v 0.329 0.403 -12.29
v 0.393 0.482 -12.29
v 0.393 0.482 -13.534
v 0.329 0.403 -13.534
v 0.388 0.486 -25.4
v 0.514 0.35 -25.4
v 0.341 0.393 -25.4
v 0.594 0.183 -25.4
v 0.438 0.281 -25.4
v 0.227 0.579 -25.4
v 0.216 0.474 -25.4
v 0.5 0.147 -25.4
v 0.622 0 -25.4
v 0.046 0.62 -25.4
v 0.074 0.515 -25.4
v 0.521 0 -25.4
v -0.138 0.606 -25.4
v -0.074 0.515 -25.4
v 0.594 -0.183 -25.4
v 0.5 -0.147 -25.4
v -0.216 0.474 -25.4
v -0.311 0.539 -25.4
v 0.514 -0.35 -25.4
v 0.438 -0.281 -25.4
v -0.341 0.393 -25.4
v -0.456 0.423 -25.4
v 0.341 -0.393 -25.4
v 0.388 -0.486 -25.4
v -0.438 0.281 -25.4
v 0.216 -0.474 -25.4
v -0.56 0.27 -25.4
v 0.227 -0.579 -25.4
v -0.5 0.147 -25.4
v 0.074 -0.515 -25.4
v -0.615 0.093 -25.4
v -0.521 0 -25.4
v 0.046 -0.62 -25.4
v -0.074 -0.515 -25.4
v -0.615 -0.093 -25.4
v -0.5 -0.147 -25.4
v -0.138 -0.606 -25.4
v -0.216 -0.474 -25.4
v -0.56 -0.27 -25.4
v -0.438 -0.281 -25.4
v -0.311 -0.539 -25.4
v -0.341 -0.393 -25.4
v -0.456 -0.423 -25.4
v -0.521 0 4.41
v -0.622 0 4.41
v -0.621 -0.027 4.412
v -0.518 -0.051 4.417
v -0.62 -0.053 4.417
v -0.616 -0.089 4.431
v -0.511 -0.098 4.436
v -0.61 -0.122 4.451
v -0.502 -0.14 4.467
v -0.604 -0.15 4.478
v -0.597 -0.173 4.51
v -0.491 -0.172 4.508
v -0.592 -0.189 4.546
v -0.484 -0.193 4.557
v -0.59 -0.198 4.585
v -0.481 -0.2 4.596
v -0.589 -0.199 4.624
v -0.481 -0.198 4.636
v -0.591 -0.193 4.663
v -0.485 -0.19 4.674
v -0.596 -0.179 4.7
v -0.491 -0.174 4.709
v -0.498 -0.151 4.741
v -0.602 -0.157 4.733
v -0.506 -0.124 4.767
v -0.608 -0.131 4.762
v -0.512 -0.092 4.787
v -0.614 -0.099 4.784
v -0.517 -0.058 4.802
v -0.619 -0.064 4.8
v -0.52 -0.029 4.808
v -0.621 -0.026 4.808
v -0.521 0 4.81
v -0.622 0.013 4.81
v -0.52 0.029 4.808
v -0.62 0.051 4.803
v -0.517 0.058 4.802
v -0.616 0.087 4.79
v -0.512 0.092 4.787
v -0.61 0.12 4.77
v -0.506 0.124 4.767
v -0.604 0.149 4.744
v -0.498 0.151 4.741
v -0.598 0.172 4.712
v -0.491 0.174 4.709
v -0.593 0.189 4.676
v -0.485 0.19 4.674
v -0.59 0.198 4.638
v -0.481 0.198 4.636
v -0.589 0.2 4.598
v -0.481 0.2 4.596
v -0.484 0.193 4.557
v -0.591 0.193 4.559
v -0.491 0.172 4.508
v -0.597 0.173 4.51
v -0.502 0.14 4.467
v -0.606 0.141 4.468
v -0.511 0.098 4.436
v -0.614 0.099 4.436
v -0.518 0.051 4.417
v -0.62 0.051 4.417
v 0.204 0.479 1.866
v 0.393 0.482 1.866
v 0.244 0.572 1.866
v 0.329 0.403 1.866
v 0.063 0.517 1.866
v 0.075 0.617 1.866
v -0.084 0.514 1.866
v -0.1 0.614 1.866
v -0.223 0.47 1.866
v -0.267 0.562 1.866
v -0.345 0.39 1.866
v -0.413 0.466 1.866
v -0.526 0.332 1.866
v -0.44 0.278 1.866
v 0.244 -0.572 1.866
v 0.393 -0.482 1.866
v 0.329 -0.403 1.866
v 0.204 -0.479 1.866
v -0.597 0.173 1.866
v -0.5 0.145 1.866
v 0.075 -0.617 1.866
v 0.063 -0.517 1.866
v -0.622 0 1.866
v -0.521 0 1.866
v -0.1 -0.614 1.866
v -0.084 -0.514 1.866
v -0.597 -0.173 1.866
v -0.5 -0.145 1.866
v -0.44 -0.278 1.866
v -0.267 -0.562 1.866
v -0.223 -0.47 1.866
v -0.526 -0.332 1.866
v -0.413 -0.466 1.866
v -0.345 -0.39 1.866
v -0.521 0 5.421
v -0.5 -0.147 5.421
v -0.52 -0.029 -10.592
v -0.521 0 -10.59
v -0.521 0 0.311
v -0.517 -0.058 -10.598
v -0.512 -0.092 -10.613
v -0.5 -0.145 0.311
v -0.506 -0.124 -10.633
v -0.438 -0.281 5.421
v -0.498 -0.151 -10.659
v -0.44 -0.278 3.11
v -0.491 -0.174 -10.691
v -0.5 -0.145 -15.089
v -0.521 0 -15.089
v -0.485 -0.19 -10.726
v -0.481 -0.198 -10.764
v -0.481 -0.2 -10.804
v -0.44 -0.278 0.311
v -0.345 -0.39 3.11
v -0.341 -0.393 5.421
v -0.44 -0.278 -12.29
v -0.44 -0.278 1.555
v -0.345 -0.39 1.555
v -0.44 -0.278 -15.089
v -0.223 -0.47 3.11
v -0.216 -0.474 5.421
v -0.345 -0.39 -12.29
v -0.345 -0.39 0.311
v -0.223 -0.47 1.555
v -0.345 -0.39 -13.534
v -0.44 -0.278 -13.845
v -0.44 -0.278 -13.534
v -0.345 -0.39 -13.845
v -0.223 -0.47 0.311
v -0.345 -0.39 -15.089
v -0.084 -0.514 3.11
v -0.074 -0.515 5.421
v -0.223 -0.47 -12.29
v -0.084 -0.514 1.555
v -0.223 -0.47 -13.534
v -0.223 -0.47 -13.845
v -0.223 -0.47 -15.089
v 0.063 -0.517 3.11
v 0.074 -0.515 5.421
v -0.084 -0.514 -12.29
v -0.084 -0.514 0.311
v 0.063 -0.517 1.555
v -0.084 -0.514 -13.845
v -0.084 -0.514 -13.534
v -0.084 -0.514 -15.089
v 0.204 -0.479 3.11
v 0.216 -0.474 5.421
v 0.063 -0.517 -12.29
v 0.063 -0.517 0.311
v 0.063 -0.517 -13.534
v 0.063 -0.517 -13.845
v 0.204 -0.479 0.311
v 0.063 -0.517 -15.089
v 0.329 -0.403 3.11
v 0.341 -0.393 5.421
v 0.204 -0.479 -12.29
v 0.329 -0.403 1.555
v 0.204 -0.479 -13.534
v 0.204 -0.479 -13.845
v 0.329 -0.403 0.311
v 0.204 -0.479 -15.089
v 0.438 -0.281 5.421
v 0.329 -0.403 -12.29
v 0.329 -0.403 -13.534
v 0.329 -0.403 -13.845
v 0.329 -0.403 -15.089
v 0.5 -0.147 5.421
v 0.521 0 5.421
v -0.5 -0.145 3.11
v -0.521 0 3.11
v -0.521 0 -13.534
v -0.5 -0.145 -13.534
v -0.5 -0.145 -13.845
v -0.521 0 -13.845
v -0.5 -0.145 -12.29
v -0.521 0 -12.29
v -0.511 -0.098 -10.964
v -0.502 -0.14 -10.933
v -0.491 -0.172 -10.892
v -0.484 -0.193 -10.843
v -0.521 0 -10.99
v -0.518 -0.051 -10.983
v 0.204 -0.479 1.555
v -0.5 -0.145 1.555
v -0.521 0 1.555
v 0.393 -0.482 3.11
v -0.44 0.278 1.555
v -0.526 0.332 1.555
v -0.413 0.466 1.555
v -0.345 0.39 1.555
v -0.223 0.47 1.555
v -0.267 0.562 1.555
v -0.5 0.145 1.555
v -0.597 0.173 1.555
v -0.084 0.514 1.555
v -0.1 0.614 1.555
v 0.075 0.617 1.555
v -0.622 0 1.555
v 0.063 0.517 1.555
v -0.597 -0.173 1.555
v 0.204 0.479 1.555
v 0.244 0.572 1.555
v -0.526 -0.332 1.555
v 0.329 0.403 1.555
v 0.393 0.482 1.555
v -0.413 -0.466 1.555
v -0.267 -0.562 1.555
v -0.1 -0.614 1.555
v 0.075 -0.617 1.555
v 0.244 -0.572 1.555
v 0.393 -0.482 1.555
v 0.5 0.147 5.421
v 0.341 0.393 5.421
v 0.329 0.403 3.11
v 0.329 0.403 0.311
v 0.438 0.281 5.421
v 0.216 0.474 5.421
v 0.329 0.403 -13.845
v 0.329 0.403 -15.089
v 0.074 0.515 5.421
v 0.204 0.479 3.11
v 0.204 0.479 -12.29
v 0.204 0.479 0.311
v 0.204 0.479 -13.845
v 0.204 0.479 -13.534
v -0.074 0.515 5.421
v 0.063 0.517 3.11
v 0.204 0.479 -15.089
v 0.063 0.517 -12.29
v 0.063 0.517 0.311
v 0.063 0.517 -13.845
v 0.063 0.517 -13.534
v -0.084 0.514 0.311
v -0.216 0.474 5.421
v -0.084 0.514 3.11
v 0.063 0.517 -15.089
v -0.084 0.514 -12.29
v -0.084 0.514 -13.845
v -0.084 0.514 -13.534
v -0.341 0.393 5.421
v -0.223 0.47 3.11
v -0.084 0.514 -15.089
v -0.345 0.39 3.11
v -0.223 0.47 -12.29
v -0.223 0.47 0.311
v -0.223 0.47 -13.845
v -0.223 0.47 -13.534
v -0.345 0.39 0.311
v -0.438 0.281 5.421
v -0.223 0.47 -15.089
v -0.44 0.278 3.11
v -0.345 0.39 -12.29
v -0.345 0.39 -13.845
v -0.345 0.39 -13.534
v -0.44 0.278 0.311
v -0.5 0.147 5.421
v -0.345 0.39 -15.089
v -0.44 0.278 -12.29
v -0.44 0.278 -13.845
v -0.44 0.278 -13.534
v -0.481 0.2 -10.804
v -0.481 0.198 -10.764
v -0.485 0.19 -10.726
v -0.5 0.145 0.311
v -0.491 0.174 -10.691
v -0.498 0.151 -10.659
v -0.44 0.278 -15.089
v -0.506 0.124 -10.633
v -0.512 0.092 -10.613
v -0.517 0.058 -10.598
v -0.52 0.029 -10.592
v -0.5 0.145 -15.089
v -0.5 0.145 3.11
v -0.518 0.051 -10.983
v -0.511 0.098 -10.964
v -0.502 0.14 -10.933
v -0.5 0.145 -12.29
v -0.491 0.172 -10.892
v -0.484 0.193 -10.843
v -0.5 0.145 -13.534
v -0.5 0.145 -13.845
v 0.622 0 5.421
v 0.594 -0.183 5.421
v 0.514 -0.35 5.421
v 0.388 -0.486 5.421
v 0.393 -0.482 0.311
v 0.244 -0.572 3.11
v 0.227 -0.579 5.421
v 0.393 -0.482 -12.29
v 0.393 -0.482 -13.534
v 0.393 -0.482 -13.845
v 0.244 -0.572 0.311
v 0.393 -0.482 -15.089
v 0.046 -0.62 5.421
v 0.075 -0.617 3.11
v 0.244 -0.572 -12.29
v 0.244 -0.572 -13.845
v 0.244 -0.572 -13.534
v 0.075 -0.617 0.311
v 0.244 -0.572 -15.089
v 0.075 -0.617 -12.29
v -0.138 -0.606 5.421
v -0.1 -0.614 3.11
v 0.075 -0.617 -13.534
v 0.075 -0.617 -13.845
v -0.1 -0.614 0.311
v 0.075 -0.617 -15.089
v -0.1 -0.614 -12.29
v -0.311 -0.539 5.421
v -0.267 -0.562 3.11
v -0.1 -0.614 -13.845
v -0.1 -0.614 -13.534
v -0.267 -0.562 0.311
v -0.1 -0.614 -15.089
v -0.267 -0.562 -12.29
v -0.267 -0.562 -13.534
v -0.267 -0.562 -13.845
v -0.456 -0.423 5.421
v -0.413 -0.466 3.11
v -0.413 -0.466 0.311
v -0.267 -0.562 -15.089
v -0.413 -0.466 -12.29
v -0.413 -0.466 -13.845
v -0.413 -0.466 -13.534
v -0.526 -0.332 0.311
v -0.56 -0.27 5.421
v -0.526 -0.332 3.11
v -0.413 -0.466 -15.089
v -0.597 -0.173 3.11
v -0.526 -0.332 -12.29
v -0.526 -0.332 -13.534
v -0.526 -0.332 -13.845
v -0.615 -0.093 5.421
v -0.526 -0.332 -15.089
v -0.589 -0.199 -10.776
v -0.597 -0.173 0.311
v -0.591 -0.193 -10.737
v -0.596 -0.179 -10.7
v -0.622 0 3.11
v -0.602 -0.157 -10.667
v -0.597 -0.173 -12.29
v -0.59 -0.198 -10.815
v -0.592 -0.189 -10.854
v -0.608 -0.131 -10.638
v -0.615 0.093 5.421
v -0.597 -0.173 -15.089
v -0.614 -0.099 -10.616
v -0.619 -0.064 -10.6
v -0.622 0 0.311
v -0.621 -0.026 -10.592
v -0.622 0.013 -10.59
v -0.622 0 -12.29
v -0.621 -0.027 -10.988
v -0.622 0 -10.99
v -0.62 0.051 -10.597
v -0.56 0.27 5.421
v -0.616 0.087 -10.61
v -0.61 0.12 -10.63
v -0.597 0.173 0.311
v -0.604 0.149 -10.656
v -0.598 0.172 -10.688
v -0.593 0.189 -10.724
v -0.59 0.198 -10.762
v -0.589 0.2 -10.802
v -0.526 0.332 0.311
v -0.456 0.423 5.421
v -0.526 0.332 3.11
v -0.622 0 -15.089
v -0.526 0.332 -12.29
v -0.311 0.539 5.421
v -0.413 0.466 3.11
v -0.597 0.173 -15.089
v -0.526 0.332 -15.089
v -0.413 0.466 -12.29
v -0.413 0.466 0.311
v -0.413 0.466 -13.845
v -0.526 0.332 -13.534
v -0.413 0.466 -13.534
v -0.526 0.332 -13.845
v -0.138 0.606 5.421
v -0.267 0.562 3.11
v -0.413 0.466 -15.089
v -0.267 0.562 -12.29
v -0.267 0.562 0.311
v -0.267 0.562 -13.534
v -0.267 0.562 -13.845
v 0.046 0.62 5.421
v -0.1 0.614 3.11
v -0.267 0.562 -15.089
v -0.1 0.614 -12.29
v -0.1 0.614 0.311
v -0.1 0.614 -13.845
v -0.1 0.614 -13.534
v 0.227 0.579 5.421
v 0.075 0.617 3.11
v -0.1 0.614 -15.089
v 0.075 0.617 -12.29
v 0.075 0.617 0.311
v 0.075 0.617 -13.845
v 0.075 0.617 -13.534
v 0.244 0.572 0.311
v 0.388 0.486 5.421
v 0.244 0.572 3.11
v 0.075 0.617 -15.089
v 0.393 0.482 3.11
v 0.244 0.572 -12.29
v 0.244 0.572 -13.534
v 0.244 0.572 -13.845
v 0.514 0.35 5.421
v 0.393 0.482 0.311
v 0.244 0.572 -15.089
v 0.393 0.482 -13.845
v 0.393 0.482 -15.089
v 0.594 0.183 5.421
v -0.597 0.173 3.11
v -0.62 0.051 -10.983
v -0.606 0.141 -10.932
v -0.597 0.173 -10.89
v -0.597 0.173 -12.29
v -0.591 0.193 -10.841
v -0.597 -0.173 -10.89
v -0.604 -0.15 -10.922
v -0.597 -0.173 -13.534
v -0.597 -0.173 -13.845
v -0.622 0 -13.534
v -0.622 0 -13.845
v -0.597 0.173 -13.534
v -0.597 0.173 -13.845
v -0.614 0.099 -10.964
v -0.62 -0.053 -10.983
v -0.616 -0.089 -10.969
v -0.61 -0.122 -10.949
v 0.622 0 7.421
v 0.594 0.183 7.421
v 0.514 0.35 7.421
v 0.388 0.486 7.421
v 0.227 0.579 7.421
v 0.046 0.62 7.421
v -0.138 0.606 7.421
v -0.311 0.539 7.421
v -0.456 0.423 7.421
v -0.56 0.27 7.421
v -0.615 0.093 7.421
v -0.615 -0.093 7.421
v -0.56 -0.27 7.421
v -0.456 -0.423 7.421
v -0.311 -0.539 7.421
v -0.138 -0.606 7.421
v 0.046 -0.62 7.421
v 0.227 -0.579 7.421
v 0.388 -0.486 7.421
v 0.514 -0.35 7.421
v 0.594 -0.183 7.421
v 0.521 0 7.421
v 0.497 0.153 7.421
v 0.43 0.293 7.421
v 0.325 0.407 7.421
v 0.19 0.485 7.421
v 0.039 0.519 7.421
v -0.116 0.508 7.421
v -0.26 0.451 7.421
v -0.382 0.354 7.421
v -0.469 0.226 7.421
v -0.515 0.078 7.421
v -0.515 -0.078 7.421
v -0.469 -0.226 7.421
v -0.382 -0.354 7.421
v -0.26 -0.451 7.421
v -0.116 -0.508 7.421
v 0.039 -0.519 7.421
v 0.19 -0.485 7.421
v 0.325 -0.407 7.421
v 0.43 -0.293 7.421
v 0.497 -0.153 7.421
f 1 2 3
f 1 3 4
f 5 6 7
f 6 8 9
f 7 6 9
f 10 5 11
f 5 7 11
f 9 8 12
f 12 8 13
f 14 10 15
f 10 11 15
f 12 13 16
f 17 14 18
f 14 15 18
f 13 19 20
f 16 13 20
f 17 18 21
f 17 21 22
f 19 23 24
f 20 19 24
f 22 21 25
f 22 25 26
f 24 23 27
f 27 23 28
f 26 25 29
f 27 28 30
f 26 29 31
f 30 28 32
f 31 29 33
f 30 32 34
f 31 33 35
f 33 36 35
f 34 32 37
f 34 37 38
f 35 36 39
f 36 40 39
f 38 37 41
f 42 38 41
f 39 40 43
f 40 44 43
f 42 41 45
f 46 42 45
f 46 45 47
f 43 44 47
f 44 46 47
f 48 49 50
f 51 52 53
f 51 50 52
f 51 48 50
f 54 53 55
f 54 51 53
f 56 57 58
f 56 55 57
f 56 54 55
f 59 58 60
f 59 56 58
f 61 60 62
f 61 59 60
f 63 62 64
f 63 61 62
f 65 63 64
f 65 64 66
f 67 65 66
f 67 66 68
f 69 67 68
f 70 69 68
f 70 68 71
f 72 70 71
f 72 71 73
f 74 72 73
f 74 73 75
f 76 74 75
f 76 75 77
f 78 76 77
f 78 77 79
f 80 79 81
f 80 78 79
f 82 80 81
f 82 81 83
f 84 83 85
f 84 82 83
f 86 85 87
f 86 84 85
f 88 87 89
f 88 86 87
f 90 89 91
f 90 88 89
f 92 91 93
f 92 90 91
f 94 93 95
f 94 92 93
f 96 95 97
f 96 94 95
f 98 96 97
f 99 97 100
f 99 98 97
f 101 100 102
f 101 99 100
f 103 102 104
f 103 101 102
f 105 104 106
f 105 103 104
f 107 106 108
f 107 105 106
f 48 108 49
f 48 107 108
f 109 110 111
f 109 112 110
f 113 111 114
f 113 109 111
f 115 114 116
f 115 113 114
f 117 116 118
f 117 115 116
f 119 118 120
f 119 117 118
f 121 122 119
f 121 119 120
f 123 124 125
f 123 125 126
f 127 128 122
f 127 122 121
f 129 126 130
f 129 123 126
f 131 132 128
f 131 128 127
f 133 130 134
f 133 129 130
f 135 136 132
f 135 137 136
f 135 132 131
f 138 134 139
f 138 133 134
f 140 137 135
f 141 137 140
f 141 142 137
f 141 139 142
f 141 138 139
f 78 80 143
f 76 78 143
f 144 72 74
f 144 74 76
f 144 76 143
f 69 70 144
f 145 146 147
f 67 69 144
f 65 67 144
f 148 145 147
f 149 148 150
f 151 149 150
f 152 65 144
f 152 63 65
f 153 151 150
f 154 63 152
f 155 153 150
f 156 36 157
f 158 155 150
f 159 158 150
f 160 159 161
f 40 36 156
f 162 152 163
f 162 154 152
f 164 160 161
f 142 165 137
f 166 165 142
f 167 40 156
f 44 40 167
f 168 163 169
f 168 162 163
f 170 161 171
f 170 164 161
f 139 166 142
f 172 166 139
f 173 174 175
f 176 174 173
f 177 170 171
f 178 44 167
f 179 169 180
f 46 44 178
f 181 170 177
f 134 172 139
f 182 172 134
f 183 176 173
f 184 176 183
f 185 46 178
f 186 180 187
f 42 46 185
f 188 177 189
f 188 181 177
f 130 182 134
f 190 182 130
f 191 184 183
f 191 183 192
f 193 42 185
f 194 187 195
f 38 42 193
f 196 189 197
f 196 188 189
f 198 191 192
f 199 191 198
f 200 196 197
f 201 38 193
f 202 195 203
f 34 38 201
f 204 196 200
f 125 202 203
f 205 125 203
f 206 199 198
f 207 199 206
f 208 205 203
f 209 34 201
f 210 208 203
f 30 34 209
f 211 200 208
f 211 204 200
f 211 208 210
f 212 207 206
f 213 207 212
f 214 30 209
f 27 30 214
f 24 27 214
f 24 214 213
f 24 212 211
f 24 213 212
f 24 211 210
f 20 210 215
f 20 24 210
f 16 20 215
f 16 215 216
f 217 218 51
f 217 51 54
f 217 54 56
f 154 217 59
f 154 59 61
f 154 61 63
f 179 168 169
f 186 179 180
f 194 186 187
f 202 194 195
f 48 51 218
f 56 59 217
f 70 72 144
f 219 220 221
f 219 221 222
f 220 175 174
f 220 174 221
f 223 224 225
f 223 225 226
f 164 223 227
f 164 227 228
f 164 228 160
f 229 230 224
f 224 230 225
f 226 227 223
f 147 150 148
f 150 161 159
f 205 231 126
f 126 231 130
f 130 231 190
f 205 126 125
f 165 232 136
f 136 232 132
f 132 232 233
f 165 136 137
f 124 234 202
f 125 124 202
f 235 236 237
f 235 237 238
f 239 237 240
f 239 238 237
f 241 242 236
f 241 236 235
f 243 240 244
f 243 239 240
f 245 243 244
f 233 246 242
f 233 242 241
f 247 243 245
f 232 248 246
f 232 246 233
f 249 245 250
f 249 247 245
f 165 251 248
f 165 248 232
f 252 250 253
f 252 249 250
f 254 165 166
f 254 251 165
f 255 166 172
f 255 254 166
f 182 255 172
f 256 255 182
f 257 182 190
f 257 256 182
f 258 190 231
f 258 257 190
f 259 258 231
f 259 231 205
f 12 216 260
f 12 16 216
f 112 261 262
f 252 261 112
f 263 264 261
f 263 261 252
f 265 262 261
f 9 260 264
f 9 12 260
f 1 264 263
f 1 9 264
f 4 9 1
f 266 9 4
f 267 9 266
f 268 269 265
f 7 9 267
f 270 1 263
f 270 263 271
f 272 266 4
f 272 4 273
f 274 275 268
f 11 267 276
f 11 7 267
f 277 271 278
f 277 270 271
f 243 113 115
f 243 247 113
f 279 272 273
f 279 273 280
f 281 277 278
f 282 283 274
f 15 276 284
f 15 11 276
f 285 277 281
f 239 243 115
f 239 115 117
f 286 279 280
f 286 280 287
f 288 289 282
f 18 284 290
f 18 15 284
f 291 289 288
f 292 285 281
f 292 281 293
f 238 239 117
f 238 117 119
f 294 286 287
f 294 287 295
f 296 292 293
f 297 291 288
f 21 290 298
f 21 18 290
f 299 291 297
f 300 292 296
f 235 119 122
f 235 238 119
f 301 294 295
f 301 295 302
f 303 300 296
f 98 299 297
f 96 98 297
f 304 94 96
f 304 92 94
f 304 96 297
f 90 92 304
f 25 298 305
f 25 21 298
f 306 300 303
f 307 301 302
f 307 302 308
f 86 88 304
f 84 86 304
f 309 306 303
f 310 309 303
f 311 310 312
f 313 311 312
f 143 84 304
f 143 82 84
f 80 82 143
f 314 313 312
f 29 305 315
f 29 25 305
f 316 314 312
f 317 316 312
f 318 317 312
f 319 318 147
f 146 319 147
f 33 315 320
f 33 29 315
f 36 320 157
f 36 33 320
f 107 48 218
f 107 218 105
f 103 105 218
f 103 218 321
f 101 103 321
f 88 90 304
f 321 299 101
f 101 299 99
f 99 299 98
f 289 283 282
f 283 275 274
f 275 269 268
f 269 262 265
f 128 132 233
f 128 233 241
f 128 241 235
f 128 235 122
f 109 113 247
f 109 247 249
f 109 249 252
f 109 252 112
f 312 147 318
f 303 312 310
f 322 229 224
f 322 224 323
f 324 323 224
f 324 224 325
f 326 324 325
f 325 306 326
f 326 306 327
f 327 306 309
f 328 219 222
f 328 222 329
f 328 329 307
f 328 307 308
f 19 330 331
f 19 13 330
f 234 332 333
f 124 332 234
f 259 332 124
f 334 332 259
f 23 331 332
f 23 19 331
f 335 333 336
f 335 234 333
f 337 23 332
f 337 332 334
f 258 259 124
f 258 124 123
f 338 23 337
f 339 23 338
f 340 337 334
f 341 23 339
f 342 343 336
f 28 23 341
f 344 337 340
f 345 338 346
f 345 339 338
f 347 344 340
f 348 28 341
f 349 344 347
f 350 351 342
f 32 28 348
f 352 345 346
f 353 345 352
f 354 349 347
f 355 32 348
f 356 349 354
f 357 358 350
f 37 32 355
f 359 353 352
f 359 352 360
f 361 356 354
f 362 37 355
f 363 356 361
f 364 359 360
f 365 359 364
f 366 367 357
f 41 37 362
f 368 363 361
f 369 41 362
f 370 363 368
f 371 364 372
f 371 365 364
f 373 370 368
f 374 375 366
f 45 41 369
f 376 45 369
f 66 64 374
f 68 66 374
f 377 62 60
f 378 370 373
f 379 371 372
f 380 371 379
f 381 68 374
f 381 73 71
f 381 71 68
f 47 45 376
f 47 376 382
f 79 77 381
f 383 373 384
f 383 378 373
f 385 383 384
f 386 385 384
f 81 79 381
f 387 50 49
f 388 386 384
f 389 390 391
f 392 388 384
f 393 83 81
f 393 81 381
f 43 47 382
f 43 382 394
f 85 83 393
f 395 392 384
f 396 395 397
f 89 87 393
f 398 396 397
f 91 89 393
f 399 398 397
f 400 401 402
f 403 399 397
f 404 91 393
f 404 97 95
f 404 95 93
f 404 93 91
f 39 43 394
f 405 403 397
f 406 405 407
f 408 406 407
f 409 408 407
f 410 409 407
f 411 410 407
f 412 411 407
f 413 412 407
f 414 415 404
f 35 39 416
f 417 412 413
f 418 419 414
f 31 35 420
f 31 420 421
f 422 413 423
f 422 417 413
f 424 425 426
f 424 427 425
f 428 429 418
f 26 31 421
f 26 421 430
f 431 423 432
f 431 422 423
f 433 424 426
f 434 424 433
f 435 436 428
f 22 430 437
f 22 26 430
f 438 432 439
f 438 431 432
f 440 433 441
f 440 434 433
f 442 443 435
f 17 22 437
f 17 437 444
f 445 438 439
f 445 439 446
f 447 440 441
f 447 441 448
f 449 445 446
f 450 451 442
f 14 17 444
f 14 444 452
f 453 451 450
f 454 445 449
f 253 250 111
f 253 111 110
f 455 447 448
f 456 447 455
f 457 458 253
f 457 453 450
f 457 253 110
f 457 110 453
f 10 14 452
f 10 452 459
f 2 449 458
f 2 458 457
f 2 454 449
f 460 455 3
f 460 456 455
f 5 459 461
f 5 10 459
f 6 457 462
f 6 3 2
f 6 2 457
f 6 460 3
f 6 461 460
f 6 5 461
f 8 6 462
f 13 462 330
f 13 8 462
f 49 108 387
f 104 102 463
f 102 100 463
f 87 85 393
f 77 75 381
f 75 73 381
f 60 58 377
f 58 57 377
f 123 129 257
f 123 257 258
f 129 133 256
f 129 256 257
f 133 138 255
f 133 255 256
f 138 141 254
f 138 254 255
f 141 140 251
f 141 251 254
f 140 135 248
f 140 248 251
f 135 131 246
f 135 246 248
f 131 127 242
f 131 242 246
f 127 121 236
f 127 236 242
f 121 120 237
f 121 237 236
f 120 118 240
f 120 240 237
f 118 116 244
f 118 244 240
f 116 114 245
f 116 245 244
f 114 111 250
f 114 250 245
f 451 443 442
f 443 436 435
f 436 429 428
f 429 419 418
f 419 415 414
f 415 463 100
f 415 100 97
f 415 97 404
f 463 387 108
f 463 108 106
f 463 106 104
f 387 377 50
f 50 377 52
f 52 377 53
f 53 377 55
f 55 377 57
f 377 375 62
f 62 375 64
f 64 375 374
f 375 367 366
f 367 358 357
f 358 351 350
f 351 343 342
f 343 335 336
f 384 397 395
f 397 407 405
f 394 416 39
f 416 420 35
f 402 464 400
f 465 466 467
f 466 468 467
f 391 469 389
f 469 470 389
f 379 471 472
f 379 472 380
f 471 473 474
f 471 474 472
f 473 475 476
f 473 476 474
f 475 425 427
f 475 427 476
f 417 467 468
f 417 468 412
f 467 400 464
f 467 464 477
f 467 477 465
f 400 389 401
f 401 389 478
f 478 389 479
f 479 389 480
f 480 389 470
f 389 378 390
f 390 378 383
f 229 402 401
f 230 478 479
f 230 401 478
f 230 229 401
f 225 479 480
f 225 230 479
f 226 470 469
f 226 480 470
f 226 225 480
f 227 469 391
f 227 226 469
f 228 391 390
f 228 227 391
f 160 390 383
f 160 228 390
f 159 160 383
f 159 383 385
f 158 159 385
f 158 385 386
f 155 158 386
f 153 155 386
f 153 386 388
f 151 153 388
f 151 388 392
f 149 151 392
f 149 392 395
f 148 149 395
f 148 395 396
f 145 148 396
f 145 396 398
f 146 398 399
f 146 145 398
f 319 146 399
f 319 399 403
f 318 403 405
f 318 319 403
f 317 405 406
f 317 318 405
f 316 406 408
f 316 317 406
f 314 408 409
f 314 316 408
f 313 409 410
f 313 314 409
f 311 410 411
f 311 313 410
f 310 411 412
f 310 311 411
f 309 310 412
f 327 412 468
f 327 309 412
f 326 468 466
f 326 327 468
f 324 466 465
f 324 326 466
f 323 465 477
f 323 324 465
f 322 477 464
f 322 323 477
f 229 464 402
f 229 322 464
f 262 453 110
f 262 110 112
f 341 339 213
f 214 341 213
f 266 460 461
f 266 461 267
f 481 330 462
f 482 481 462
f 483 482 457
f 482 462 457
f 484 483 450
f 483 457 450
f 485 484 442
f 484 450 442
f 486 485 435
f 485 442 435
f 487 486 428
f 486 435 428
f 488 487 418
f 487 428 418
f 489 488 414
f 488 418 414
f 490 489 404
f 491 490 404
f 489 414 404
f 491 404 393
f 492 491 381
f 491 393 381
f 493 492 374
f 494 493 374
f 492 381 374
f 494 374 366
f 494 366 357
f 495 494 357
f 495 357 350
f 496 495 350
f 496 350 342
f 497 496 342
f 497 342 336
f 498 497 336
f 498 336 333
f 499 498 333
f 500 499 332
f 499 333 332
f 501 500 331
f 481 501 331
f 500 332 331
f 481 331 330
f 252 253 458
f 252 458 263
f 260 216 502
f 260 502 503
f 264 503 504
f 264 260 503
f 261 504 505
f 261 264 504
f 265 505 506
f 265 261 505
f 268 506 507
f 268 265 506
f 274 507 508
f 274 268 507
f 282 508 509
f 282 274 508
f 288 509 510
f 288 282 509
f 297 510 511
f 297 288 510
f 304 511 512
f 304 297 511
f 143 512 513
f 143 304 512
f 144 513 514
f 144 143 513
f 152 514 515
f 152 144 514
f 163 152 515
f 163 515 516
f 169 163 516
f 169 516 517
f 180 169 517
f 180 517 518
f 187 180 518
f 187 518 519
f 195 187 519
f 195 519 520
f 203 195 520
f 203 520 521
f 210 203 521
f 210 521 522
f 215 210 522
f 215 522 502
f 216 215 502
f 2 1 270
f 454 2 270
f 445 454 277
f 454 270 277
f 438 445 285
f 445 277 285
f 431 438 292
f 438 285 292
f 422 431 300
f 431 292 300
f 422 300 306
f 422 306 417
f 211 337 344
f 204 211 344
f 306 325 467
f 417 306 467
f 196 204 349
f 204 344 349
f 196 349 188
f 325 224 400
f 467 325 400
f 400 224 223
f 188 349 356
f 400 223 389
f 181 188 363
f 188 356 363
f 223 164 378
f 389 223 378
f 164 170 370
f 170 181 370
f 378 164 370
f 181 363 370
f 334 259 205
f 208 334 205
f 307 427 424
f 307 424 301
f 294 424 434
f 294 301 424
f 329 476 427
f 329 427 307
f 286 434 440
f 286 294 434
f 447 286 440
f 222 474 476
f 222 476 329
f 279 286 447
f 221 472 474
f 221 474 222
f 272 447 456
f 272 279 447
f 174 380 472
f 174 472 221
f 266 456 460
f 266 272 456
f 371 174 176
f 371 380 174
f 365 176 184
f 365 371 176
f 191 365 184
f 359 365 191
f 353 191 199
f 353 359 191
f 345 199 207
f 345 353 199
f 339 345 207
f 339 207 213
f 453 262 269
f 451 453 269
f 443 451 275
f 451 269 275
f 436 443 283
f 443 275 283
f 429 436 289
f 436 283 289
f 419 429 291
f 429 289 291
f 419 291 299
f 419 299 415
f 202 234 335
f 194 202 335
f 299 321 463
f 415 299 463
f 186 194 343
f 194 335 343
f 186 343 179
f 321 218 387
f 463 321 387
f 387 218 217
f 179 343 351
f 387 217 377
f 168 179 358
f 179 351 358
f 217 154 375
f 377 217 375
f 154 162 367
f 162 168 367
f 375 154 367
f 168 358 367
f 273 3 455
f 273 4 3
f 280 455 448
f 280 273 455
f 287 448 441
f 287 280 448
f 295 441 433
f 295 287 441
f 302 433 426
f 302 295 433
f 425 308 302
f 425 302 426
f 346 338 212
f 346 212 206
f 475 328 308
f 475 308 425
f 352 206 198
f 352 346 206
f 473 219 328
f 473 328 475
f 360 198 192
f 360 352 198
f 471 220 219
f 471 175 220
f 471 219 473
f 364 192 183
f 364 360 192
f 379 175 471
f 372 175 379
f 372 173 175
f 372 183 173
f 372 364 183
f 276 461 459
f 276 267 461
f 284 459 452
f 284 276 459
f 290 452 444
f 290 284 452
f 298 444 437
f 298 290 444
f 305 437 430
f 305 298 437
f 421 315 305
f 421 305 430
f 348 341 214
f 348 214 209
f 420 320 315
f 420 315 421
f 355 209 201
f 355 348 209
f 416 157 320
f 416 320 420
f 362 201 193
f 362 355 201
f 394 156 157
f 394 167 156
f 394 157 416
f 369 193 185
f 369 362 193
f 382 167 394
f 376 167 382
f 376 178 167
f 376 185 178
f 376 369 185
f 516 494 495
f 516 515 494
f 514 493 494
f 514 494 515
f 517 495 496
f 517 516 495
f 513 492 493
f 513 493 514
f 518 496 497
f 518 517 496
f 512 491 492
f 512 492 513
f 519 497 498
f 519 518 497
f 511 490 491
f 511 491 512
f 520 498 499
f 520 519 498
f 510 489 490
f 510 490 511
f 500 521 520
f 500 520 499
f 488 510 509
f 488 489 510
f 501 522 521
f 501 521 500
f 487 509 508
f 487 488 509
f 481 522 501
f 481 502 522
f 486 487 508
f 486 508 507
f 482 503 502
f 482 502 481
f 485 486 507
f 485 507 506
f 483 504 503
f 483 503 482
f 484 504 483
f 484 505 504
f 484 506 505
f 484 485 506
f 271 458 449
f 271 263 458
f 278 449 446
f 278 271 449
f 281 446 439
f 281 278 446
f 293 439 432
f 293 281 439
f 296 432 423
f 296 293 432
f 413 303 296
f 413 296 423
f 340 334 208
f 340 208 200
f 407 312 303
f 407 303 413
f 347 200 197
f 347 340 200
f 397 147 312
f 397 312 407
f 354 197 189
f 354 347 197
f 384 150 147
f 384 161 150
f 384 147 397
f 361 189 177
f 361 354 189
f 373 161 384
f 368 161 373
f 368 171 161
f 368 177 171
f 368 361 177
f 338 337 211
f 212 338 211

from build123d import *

# Parameters (mm, degrees)
SURFACE_EXTRUDE1_1_DEPTH   = 1.866
SURFACE_TRIM1_TOOL_2_BACK  = 3.327
SURFACE_TRIM1_TOOL_2_DEPTH = 6.654
THICKEN2_T1                = 0.101386
LPATTERN3_COUNT            = 2
LPATTERN3_PITCH            = 1.555
BOSS_EXTRUDE1_DEPTH        = 10
BOSS_EXTRUDE2_DEPTH        = 2
SKETCH7_R                  = 0.2
CUT_EXTRUDE2_DEPTH         = 11.038613849
LPATTERN4_COUNT            = 2
LPATTERN4_PITCH            = 15.4
SKETCH9_R                  = 0.622
SKETCH9_R_2                = 0.520614
BOSS_EXTRUDE3_DEPTH        = 2


with BuildPart() as body_1:
    # Surface-Extrude1: a surface, the sketch's curves swept straight by 1.866 mm
    with BuildLine(Plane.XY, mode=Mode.PRIVATE) as surface_extrude1_1_path:
        ThreePointArc((0.622, 0), (0, 0.622), (-0.622, 0))
    surface_extrude1_1 = Shell.extrude(surface_extrude1_1_path.wire(), (0 * SURFACE_EXTRUDE1_1_DEPTH, 0 * SURFACE_EXTRUDE1_1_DEPTH, 1 * SURFACE_EXTRUDE1_1_DEPTH))
    # Surface-Trim1 tool: a surface, the sketch's curves swept straight by 6.654 mm
    with BuildLine(Plane(origin=(0, 0, 0), x_dir=(1, 0, 0), z_dir=(0, 1, 0)).offset(-SURFACE_TRIM1_TOOL_2_BACK), mode=Mode.PRIVATE) as surface_trim1_tool_2_path:
        Line((-0.622, -1.555), (0.3932, -1.555))
        Line((0.3932, -1.555), (0.3932, -0.311))
        Line((0.3932, -0.311), (-0.622, -0.311))
    surface_trim1_tool_2 = Shell.extrude(surface_trim1_tool_2_path.wire(), (0 * SURFACE_TRIM1_TOOL_2_DEPTH, 1 * SURFACE_TRIM1_TOOL_2_DEPTH, 0 * SURFACE_TRIM1_TOOL_2_DEPTH))
    # Surface-Trim1: the surface trimmed, the side behind the tool kept
    surface_trim1_3 = split(surface_extrude1_1.faces()[0], bisect_by=surface_trim1_tool_2, keep=Keep.BOTTOM).faces()[0]
    add(Solid.thicken(surface_trim1_3, THICKEN2_T1))


with BuildPart() as lpattern3_1:
    # LPattern3: pattern copy
    add(body_1.part.moved(Location(Vector(0, 0, 1) * (1 * LPATTERN3_PITCH))))

    # Combine1: union body 1
    add(body_1.part)

    # Sketch5 → Boss-Extrude1 (add)
    with BuildSketch(Plane(origin=(0, 0, 0), x_dir=(-1, 0, 0), z_dir=(0, 0, -1))):
        with BuildLine():
            Line((-0.622, 0), (-0.520614, 0))
            ThreePointArc((-0.520614, 0), (0, 0.520614), (0.520614, 0))
            Line((0.520614, 0), (0.622, 0))
            ThreePointArc((0.622, 0), (0, 0.622), (-0.622, 0))
        make_face()
    extrude(amount=BOSS_EXTRUDE1_DEPTH)

    # Sketch6 → Boss-Extrude2 (add)
    with BuildSketch(Plane.XY.offset(3.421)):
        with BuildLine():
            Line((-0.622, 0), (-0.520614, 0))
            ThreePointArc((-0.520614, 0), (0, 0.520614), (0.520614, 0))
            Line((0.520614, 0), (0.622, 0))
            ThreePointArc((0.622, 0), (0, 0.622), (-0.622, 0))
        make_face()
    extrude(amount=BOSS_EXTRUDE2_DEPTH)

    # Sketch7 → Cut-Extrude2 (cut, through all)
    with BuildSketch(Plane(origin=(0, 0, 0), x_dir=(0, 0, -1), z_dir=(1, 0, 0))):
        with Locations((-4.61, 0)):
            Circle(SKETCH7_R)
    extrude(amount=-CUT_EXTRUDE2_DEPTH, mode=Mode.SUBTRACT)

    # Mirror1: LPattern3_1 across face


with BuildPart() as lpattern3_1_1:
    add(lpattern3_1.part)
    add(lpattern3_1.part.mirror(Plane(origin=(0.571307, 0, -2.2895), x_dir=(0, 0, 1), z_dir=(0, -1, 0))))


with BuildPart() as lpattern4_1:
    # LPattern4: pattern copy
    add(lpattern3_1_1.part.moved(Location(Vector(0, 0, -1) * (1 * LPATTERN4_PITCH))))

    # Combine2: union LPattern3_1
    add(lpattern3_1_1.part)

    # Sketch9 → Boss-Extrude3 (add)
    with BuildSketch(Plane.XY.offset(5.421)):
        Circle(SKETCH9_R)
        Circle(SKETCH9_R_2, mode=Mode.SUBTRACT)
    extrude(amount=BOSS_EXTRUDE3_DEPTH)


solid = lpattern4_1.part
